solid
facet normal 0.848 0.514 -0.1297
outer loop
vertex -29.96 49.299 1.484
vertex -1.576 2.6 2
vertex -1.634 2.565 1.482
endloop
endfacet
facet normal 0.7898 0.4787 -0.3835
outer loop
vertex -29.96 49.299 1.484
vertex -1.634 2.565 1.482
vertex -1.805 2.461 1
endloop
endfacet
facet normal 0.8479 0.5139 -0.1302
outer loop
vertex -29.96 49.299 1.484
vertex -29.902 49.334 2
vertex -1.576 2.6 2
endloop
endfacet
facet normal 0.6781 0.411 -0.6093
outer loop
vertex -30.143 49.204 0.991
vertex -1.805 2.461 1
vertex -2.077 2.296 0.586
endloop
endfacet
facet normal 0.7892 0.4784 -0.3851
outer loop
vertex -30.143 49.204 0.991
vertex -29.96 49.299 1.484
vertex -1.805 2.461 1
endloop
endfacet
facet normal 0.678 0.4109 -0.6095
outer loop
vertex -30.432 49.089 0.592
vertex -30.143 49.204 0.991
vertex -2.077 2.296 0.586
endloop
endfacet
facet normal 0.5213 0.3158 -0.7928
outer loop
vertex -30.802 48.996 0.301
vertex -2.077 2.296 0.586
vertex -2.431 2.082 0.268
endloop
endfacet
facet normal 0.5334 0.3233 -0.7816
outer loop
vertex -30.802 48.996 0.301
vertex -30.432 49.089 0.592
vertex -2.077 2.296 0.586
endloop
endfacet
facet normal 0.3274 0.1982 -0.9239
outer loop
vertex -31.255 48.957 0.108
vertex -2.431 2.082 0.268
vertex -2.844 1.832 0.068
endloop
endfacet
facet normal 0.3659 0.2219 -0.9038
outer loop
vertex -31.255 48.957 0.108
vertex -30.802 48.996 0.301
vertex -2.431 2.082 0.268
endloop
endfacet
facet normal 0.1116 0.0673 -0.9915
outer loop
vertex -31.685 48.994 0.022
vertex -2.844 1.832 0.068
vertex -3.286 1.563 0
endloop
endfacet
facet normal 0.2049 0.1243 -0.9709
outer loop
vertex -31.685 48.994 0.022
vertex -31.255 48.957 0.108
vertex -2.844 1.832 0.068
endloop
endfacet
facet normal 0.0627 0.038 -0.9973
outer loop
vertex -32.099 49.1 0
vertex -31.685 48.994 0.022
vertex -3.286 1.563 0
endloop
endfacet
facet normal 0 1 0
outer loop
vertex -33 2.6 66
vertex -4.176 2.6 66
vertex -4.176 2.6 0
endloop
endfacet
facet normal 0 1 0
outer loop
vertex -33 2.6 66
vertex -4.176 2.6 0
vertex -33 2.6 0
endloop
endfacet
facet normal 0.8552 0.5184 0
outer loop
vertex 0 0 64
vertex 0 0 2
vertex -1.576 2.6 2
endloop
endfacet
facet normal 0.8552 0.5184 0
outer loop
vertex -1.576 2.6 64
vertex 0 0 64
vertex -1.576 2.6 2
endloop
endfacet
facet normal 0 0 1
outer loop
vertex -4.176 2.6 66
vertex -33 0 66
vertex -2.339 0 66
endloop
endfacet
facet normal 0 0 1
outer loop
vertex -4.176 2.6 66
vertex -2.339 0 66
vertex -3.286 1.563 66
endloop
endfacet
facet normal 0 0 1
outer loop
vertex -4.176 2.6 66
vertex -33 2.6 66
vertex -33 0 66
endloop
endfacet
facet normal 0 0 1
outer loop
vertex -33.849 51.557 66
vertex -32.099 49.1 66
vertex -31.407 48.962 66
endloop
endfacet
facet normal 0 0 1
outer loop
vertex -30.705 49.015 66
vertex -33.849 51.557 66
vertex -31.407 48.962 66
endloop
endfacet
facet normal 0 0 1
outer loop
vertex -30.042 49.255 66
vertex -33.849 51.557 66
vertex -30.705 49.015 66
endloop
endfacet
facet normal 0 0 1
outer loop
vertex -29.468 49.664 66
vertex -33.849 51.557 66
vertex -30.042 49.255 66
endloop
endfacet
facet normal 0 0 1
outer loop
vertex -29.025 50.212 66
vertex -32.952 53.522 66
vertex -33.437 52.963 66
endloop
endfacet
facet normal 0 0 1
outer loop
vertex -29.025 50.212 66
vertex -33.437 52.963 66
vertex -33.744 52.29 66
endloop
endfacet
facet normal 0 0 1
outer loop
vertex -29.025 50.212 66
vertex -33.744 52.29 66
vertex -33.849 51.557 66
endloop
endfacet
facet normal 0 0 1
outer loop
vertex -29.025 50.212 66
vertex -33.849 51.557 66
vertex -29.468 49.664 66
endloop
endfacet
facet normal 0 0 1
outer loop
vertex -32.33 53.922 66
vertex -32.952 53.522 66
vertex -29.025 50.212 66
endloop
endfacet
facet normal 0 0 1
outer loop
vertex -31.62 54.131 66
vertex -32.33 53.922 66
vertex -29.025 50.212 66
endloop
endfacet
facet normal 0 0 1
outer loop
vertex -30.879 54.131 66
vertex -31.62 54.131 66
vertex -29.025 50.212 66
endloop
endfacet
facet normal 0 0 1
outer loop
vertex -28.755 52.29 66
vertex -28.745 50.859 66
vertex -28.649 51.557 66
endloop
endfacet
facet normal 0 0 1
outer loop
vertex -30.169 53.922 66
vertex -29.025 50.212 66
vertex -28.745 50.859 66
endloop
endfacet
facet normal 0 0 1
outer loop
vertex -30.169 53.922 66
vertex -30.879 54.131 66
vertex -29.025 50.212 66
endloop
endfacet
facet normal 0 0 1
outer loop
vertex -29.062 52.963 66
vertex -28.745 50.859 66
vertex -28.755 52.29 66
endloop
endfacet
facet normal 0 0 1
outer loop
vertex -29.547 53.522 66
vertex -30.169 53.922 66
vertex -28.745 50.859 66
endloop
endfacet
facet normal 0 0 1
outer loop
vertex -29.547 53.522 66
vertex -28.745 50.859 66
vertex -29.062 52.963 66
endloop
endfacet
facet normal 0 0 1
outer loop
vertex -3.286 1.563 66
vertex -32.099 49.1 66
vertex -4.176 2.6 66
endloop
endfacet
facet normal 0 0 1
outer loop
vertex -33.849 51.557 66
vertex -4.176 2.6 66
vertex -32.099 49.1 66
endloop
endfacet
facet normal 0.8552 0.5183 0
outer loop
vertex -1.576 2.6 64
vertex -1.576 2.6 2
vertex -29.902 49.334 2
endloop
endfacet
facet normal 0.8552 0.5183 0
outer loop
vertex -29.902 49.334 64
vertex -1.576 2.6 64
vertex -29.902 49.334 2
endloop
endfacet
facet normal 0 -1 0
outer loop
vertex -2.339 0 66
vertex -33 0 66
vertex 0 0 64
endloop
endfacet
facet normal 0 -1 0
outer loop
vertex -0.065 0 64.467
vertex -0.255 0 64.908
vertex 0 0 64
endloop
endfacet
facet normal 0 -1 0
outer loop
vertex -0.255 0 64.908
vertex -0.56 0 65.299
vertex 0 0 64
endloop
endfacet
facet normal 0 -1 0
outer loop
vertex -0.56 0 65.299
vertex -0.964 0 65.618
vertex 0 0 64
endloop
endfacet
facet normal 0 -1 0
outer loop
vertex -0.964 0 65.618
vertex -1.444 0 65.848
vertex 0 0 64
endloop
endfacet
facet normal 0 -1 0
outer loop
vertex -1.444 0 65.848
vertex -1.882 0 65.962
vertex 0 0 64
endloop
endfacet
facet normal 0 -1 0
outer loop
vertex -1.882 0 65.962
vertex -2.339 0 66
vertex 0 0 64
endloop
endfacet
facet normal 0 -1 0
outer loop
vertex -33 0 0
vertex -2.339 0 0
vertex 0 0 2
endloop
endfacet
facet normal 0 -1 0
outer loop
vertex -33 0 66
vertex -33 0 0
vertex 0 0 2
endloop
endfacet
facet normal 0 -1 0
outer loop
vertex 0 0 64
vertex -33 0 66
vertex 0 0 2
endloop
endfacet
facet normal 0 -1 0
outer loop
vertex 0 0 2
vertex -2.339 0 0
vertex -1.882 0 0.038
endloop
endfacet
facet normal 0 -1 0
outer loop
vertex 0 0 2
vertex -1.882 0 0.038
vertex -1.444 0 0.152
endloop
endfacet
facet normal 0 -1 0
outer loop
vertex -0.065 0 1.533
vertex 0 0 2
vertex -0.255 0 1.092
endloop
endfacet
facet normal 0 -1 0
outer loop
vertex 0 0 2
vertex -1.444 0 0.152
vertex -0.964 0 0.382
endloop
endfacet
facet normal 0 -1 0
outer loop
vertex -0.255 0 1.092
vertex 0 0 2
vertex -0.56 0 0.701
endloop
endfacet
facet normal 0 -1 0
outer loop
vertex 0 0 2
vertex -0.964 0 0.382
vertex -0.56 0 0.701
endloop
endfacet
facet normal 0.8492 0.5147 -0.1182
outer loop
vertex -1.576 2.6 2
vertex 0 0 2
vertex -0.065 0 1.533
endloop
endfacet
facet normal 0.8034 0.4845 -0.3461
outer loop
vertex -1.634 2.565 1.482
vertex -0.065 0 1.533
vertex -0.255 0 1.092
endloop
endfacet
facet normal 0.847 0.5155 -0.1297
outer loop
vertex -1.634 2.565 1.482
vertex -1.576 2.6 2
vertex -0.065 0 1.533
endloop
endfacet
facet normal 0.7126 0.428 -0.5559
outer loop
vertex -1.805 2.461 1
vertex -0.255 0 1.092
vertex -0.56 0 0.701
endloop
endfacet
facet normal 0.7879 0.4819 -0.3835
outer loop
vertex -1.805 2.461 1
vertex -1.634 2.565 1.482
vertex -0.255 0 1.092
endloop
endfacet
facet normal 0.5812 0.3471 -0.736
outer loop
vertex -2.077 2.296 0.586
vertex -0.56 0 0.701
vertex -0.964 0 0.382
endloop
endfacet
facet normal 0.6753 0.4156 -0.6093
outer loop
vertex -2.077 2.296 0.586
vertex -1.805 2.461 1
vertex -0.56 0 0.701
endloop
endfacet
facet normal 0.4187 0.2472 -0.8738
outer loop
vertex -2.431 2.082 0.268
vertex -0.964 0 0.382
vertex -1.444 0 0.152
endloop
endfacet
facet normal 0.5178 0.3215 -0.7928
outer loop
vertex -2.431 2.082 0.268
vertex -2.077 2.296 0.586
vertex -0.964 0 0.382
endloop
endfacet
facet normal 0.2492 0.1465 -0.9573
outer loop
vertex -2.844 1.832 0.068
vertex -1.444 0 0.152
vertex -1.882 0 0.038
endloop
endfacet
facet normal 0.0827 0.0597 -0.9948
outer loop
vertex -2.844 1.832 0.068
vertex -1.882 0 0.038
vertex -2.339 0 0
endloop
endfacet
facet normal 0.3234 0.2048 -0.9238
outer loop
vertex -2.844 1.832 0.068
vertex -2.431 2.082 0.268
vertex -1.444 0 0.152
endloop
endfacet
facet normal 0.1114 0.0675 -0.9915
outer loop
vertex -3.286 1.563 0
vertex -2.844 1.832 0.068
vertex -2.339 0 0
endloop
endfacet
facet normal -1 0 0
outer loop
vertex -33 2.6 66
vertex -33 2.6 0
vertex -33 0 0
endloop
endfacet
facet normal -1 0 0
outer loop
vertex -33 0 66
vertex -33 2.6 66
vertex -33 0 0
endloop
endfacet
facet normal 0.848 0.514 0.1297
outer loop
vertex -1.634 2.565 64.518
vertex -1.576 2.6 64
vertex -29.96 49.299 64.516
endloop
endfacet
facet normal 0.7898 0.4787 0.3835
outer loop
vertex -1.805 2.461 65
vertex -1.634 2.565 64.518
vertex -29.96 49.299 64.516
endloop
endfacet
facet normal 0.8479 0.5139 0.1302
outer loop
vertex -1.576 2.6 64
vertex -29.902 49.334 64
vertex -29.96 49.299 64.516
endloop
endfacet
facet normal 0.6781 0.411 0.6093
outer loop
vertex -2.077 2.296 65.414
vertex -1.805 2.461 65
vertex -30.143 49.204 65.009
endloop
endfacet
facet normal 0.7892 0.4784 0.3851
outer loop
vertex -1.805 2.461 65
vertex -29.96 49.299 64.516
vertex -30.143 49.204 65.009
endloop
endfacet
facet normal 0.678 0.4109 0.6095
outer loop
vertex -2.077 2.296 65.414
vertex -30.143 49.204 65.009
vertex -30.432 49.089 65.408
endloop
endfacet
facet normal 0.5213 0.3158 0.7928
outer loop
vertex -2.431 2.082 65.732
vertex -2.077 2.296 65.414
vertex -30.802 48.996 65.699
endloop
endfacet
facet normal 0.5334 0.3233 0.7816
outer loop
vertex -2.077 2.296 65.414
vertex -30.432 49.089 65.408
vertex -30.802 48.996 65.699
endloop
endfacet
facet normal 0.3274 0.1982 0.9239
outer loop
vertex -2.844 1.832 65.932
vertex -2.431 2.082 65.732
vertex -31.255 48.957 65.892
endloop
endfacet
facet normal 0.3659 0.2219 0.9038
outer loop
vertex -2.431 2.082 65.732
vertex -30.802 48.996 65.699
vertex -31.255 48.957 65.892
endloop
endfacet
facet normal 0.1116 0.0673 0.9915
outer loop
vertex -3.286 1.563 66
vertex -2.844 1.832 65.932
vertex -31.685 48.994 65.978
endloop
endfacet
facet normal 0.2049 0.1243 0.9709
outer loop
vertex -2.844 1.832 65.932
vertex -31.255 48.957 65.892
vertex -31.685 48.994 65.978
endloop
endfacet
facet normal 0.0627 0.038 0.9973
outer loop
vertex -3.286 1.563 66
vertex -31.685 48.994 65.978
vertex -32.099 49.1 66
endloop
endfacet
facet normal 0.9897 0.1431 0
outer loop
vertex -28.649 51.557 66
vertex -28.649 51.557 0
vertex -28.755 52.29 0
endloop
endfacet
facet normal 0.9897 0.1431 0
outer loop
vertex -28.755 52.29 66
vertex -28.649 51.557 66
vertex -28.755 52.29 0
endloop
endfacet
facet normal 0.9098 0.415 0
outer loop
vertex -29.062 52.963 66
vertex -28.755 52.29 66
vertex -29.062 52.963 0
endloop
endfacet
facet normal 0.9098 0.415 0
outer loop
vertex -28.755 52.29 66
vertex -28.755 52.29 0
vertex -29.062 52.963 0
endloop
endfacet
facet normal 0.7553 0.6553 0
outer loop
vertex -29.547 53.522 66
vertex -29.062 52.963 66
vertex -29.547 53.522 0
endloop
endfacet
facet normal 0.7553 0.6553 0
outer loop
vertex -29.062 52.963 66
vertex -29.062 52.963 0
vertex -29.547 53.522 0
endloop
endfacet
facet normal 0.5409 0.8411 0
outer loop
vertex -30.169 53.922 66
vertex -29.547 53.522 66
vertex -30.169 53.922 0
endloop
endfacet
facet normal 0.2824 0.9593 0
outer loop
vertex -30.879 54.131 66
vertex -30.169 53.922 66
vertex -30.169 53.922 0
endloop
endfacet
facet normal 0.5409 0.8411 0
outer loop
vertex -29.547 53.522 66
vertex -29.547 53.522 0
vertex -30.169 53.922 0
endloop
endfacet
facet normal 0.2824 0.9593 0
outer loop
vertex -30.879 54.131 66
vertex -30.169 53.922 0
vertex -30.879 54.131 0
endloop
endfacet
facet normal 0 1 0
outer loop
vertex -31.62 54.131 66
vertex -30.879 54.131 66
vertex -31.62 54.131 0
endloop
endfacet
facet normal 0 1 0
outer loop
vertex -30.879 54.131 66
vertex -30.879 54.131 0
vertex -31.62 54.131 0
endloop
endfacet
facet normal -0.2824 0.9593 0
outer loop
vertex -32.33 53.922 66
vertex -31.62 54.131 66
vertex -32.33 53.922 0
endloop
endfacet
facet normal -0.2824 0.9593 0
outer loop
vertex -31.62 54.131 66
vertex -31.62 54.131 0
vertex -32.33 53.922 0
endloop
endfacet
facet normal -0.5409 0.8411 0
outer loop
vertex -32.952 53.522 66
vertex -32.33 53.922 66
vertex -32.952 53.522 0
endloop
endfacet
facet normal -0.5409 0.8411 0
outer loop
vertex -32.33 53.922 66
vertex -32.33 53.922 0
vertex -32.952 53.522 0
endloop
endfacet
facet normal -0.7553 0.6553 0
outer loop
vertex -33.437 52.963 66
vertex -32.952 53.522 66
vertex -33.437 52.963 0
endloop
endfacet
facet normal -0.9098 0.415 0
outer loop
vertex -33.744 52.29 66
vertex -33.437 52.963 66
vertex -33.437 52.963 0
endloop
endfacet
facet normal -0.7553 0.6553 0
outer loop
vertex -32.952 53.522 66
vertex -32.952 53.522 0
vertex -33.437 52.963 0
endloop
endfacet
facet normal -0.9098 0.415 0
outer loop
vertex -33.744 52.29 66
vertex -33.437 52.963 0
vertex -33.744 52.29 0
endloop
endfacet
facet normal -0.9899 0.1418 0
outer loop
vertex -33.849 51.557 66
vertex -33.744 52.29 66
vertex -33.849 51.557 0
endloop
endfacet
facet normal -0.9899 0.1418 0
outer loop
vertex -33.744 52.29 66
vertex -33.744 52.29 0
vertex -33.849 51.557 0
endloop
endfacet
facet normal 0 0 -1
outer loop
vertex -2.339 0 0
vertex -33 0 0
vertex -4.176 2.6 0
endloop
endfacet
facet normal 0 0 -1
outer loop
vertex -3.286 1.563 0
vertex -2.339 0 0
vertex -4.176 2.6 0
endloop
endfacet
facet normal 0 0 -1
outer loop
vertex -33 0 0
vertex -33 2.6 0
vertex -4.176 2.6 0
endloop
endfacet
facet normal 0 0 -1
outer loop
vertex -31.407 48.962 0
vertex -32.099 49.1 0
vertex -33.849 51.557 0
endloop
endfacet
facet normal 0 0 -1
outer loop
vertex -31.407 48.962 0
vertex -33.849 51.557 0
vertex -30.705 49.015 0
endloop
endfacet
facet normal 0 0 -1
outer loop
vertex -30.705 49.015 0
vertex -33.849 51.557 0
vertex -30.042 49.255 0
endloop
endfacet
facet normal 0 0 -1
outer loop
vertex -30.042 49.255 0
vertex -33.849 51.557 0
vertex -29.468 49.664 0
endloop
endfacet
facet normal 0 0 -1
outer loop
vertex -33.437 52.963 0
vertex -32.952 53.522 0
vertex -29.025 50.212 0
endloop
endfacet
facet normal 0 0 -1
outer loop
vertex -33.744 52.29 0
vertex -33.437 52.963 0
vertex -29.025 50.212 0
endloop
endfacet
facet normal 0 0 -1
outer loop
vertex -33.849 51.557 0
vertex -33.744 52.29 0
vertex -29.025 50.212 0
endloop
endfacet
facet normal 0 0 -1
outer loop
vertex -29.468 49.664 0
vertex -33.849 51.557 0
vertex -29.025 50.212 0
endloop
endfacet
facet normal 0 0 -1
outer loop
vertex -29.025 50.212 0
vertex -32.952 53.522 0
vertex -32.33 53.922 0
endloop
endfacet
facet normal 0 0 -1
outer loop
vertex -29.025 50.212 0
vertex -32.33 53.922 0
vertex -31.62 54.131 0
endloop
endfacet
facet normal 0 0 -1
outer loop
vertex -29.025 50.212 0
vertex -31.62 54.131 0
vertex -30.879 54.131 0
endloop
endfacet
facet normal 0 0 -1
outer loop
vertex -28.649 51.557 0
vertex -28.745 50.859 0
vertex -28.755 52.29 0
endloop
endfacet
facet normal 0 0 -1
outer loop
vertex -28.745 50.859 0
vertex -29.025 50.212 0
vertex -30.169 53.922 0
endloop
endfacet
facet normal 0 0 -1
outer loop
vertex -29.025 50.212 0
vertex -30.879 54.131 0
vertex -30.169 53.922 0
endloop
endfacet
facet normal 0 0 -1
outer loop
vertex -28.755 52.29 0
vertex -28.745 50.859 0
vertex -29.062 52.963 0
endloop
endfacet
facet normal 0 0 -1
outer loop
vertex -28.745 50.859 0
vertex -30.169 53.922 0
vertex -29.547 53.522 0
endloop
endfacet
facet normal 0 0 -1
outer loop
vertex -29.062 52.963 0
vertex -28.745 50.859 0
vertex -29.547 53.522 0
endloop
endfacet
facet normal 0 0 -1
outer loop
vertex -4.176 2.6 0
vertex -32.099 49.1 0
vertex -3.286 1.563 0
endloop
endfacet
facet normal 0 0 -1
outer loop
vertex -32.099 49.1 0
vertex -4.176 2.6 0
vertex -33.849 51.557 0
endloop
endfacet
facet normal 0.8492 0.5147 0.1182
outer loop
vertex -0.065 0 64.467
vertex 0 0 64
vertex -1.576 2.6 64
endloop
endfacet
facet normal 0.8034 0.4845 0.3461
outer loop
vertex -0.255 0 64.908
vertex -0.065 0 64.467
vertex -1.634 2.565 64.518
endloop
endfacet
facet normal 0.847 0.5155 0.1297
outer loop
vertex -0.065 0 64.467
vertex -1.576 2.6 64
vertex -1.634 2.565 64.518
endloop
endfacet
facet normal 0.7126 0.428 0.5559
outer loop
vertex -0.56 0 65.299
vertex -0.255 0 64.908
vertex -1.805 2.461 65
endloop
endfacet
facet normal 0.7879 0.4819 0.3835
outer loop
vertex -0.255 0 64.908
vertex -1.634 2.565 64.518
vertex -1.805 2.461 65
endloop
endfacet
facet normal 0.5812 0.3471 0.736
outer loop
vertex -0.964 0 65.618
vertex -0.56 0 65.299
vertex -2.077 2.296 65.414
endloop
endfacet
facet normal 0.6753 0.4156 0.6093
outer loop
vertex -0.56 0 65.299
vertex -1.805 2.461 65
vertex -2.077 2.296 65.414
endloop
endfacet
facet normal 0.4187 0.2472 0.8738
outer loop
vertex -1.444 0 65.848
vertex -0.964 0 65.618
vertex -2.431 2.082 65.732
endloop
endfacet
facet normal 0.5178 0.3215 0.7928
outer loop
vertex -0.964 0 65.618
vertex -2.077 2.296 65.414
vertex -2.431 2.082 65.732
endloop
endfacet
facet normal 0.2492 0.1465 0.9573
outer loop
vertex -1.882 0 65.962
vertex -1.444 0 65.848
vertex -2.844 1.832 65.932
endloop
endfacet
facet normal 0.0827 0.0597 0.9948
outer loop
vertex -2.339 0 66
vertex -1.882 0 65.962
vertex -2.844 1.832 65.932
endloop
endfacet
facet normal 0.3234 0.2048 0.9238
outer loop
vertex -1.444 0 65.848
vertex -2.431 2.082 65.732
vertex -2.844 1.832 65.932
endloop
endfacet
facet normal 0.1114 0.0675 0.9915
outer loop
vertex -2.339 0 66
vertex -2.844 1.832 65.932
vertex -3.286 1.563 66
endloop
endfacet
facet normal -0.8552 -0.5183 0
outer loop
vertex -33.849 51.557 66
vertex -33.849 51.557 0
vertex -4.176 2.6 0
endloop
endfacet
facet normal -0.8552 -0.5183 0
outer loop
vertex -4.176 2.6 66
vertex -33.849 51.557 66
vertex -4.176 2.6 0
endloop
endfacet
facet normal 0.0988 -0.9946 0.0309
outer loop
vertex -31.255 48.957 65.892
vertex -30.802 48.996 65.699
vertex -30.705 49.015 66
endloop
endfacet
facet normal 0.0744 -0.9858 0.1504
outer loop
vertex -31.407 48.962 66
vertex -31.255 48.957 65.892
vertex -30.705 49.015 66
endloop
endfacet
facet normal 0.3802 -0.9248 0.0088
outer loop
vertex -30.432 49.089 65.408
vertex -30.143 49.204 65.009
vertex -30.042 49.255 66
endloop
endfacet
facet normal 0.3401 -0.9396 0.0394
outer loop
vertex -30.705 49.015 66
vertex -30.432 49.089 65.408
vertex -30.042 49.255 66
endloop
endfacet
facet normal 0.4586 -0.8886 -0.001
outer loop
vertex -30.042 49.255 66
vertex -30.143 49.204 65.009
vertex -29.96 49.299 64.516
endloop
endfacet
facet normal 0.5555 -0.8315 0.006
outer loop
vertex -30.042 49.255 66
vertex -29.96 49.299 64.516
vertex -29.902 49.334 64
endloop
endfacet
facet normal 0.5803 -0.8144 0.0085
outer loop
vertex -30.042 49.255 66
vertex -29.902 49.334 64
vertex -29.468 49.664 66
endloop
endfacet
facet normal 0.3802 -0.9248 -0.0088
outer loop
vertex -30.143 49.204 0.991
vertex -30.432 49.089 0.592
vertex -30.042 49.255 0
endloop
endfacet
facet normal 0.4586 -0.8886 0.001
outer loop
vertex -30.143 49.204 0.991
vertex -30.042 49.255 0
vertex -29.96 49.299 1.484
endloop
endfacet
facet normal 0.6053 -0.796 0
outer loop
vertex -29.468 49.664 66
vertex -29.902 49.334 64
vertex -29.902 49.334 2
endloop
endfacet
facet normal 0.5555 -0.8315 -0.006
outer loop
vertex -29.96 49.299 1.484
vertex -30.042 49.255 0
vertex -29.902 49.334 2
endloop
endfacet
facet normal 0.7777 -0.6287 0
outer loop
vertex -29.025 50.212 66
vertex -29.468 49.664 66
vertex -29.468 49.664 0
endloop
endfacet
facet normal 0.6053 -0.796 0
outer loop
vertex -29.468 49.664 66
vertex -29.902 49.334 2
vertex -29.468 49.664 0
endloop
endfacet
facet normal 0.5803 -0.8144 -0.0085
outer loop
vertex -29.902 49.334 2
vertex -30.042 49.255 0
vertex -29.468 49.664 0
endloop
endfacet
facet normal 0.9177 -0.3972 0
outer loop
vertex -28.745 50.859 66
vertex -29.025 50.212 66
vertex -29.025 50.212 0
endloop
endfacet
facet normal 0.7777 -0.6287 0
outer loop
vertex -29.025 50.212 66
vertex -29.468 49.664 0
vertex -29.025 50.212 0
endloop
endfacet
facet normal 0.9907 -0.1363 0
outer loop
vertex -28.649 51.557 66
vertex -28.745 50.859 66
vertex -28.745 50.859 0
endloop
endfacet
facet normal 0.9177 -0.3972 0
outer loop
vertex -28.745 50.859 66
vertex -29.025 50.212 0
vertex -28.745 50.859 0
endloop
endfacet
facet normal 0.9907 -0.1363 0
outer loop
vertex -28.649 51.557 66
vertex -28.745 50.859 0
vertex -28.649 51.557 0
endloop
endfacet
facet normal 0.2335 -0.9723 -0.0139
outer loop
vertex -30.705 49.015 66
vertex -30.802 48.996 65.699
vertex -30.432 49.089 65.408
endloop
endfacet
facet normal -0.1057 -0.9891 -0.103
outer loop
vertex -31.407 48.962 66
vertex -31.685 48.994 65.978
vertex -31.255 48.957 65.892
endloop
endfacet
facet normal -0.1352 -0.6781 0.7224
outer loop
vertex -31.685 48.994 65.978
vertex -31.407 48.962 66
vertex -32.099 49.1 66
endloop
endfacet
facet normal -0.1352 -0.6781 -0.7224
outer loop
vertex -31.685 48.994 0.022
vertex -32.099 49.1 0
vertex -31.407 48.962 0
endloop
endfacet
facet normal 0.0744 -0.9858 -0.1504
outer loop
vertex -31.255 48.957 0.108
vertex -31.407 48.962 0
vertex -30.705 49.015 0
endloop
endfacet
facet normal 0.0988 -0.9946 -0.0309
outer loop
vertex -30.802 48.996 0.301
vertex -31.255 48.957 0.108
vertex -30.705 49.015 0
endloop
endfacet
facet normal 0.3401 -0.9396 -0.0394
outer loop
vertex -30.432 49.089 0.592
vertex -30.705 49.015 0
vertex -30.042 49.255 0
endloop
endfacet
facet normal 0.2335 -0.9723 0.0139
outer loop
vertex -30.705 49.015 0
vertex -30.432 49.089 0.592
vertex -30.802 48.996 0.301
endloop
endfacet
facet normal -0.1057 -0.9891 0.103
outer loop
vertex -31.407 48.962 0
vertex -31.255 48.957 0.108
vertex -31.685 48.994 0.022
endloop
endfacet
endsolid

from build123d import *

# Parameters (mm, degrees)
F1_DEPTH = 66
F2_R     = 2


with BuildPart() as f1:
    # F0 (on Top) → F1 (new body)
    with BuildSketch(Plane.XY):
        with BuildLine():
            Line((-4.1758986024, 2.6), (-1.5758986024, 2.6))
            Line((-1.5758986024, 2.6), (-29.9018225579, 49.3335919775))
            ThreePointArc((-29.9018225579, 49.3335919775), (-31.1664206107, 48.9583804101), (-32.452401675, 49.252054818))
            Line((-32.452401675, 49.252054818), (-4.1758986024, 2.6))
        make_face()
        with BuildLine():
            Line((-31.2494952232, 51.5570528805), (-29.9018225579, 49.3335919775))
            ThreePointArc((-29.9018225579, 49.3335919775), (-28.9841090608, 50.2811118415), (-28.6494952232, 51.5570528805))
            ThreePointArc((-28.6494952232, 51.5570528805), (-31.2494952232, 54.1570528805), (-33.8494952232, 51.5570528805))
            Line((-33.8494952232, 51.5570528805), (-31.2494952232, 51.5570528805))
        make_face()
        with BuildLine():
            ThreePointArc((-32.452401675, 49.252054818), (-31.1664206107, 48.9583804101), (-29.9018225579, 49.3335919775))
            Line((-29.9018225579, 49.3335919775), (-31.2494952232, 51.5570528805))
            Line((-31.2494952232, 51.5570528805), (-33.8494952232, 51.5570528805))
            Line((-33.8494952232, 51.5570528805), (-32.452401675, 49.252054818))
        make_face()
        Polygon((-33, 0), (0, 0), (-1.5758986024, 2.6), (-4.1758986024, 2.6), (-33, 2.6), align=None)
    extrude(amount=F1_DEPTH)

    # F2
    f2_edges = [f1.edges().sort_by_distance(p)[0] for p in [
        (-14.950911, 24.666796, 66),
        (-14.950911, 24.666796, 0),
    ]]
    fillet(f2_edges, radius=F2_R)


solid = f1.part
